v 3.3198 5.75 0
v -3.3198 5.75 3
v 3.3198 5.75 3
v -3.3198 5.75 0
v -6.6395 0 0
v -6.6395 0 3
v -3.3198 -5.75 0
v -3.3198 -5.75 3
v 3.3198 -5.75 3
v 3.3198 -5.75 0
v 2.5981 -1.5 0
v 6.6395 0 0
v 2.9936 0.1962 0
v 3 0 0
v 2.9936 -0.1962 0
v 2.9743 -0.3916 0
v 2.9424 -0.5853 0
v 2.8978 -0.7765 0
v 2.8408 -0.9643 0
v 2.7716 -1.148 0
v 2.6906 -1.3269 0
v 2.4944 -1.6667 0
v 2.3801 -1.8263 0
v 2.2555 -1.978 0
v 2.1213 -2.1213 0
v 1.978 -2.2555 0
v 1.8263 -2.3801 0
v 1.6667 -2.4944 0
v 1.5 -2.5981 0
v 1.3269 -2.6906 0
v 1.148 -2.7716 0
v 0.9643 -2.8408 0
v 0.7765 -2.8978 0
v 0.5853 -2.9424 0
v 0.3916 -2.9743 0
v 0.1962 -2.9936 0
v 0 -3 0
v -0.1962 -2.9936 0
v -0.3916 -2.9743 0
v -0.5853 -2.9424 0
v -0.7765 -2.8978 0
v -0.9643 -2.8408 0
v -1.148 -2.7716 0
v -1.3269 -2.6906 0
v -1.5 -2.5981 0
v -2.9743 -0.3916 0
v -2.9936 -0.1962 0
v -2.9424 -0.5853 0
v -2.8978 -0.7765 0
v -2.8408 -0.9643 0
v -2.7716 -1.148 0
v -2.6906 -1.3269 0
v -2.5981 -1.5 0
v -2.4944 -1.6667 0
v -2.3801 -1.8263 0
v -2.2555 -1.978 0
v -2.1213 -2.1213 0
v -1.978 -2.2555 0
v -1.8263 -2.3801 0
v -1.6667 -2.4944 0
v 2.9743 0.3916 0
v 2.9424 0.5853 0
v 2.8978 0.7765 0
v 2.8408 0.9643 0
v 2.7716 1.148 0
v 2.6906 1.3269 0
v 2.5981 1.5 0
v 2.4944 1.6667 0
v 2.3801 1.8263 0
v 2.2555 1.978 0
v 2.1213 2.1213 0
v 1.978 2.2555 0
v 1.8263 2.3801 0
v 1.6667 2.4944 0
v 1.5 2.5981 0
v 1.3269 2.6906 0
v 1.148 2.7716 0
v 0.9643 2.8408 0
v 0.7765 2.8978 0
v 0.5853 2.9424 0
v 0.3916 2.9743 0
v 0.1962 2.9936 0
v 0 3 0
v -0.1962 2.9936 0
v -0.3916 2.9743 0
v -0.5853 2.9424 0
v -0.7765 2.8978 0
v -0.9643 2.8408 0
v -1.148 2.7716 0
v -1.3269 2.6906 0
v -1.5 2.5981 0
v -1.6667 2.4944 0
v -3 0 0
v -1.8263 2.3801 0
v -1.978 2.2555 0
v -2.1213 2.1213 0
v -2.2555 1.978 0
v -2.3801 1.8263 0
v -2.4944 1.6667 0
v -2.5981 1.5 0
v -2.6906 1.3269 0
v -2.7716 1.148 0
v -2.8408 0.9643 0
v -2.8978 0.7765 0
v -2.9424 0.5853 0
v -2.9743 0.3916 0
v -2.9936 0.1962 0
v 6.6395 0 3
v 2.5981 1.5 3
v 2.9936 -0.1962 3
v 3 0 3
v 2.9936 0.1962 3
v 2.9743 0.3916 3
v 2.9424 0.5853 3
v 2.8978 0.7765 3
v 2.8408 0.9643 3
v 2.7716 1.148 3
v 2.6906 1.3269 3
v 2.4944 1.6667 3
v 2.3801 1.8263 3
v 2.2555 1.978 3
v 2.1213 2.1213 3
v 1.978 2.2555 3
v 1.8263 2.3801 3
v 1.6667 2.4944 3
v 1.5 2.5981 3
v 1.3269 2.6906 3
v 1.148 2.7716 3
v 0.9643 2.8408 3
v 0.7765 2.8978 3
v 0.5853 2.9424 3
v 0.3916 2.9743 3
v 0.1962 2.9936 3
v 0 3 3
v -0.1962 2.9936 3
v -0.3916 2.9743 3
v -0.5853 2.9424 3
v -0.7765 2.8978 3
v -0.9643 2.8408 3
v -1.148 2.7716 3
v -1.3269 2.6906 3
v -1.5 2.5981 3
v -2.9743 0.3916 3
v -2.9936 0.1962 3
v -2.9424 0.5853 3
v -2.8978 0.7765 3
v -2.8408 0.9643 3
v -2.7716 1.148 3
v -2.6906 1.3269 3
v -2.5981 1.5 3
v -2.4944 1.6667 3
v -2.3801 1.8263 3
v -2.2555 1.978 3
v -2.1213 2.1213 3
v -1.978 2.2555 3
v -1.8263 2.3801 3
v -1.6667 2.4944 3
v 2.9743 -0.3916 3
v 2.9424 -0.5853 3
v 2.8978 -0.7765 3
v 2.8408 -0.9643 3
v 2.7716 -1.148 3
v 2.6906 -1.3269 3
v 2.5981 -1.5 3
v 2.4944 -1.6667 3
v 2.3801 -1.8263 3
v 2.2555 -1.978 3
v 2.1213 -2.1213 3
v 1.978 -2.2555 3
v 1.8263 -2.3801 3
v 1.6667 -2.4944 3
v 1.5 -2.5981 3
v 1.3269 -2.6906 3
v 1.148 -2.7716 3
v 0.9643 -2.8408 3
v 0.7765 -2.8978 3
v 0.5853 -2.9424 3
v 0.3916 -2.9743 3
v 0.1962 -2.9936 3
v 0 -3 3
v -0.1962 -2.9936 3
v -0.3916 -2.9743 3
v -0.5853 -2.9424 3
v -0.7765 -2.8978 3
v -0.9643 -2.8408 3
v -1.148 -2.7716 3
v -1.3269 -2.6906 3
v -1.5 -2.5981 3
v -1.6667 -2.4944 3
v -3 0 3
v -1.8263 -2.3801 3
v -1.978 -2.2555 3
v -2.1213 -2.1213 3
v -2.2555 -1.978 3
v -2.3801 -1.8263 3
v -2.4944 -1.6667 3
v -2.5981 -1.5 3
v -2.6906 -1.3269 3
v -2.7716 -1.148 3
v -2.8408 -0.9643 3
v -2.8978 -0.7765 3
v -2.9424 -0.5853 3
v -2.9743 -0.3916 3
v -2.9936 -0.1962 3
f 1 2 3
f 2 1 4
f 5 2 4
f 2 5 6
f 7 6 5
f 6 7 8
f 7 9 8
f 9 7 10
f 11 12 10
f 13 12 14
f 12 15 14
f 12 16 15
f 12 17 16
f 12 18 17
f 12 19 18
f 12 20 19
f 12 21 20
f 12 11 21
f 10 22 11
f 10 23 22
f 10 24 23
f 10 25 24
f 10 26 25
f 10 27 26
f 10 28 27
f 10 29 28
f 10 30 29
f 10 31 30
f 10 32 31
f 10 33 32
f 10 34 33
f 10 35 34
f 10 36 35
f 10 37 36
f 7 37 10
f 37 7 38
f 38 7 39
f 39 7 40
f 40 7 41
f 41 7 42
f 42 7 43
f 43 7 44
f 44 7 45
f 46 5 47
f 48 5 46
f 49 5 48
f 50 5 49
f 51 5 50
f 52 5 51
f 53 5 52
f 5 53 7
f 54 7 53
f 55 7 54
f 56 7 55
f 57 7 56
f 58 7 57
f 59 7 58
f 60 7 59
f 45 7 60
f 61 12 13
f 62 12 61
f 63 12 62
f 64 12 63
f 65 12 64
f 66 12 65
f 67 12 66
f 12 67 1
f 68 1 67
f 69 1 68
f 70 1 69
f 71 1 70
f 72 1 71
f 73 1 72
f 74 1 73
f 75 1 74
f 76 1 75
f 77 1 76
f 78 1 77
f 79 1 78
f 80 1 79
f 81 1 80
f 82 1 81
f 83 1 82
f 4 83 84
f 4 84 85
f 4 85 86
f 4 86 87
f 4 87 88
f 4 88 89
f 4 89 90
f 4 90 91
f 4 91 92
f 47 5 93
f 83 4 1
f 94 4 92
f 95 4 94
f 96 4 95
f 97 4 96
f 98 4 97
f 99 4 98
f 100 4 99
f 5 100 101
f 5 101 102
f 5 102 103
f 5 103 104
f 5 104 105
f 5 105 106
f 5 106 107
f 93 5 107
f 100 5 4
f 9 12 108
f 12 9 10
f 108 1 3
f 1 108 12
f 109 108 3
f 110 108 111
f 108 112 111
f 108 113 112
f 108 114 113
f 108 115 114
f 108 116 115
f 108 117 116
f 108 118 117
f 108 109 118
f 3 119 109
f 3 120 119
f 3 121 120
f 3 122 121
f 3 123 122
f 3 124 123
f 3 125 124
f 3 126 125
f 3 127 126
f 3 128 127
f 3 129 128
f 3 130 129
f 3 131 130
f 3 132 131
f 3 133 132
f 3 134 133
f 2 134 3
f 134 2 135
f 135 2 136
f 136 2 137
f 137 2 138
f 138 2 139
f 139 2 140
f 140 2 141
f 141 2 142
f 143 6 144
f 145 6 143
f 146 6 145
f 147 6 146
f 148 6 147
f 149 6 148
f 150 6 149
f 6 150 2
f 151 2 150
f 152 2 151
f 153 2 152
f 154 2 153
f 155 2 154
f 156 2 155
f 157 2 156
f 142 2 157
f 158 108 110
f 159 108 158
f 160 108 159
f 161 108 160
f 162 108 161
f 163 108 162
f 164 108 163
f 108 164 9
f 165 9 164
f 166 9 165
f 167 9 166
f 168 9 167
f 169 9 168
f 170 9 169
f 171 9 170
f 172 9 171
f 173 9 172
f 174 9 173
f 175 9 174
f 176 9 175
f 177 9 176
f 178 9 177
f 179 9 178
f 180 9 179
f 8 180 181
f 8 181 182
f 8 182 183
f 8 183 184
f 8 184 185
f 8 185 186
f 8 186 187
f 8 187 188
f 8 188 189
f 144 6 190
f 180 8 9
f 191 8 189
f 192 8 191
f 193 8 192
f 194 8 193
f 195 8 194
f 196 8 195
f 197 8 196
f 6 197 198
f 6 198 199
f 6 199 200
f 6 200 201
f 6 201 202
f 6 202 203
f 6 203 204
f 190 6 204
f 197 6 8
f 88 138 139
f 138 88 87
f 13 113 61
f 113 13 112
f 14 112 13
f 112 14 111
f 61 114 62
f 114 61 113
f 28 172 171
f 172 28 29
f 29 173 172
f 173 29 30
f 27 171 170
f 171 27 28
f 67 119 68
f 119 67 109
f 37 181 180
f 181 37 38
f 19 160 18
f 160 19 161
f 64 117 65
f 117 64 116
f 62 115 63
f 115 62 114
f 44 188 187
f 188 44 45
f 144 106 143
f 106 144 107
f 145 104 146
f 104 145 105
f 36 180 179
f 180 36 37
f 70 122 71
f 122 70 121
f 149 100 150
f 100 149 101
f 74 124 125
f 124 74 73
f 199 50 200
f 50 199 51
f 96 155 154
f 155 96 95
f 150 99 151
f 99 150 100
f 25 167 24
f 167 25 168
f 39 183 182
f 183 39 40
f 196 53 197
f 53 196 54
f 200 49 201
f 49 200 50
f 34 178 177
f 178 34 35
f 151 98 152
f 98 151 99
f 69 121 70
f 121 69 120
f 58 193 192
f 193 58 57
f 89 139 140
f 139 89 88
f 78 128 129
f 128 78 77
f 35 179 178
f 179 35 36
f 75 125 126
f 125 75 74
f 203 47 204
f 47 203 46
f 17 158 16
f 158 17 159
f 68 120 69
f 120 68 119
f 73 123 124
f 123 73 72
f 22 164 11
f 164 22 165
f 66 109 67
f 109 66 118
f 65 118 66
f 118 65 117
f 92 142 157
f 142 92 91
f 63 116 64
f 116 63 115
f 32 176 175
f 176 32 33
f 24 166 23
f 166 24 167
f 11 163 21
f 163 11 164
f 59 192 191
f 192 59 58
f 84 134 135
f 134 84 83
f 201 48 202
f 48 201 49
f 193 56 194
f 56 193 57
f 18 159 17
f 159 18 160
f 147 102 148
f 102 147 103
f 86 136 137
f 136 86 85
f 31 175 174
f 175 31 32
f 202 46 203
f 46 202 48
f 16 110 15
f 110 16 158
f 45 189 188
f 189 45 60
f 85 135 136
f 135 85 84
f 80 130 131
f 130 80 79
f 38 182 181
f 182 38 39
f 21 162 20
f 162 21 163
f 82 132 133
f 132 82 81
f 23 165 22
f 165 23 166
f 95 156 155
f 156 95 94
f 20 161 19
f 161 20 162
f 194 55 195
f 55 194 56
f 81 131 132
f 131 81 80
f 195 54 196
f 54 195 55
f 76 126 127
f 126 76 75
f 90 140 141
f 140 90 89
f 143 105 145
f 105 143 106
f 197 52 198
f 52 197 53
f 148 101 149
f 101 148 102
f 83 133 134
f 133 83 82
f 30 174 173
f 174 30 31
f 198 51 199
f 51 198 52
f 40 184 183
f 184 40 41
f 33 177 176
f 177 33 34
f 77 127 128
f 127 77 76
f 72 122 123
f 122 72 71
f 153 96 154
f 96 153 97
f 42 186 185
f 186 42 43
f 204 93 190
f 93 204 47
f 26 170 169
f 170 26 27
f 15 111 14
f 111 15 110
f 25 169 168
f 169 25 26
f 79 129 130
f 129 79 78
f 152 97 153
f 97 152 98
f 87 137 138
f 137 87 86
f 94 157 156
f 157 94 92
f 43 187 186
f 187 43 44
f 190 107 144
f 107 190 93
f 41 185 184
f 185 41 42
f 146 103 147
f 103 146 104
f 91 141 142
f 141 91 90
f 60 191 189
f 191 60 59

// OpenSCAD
$fn = 96;

across_flats = 11.5;   // mm
thickness    = 3.0;    // mm
hole_d       = 6.0;    // mm (clearance hole as specified)

module hex_prism_af(af, h){
    // For a regular hexagon: across flats = 2 * apothem
    // Circumradius R = af / sqrt(3)
    R = af / sqrt(3);
    linear_extrude(height = h)
        polygon(points = [ for (i = [0:5]) [ R*cos(60*i), R*sin(60*i) ] ]);
}

difference() {
    hex_prism_af(across_flats, thickness);
    translate([0,0,-0.2])
        cylinder(d = hole_d, h = thickness + 0.4);
}
